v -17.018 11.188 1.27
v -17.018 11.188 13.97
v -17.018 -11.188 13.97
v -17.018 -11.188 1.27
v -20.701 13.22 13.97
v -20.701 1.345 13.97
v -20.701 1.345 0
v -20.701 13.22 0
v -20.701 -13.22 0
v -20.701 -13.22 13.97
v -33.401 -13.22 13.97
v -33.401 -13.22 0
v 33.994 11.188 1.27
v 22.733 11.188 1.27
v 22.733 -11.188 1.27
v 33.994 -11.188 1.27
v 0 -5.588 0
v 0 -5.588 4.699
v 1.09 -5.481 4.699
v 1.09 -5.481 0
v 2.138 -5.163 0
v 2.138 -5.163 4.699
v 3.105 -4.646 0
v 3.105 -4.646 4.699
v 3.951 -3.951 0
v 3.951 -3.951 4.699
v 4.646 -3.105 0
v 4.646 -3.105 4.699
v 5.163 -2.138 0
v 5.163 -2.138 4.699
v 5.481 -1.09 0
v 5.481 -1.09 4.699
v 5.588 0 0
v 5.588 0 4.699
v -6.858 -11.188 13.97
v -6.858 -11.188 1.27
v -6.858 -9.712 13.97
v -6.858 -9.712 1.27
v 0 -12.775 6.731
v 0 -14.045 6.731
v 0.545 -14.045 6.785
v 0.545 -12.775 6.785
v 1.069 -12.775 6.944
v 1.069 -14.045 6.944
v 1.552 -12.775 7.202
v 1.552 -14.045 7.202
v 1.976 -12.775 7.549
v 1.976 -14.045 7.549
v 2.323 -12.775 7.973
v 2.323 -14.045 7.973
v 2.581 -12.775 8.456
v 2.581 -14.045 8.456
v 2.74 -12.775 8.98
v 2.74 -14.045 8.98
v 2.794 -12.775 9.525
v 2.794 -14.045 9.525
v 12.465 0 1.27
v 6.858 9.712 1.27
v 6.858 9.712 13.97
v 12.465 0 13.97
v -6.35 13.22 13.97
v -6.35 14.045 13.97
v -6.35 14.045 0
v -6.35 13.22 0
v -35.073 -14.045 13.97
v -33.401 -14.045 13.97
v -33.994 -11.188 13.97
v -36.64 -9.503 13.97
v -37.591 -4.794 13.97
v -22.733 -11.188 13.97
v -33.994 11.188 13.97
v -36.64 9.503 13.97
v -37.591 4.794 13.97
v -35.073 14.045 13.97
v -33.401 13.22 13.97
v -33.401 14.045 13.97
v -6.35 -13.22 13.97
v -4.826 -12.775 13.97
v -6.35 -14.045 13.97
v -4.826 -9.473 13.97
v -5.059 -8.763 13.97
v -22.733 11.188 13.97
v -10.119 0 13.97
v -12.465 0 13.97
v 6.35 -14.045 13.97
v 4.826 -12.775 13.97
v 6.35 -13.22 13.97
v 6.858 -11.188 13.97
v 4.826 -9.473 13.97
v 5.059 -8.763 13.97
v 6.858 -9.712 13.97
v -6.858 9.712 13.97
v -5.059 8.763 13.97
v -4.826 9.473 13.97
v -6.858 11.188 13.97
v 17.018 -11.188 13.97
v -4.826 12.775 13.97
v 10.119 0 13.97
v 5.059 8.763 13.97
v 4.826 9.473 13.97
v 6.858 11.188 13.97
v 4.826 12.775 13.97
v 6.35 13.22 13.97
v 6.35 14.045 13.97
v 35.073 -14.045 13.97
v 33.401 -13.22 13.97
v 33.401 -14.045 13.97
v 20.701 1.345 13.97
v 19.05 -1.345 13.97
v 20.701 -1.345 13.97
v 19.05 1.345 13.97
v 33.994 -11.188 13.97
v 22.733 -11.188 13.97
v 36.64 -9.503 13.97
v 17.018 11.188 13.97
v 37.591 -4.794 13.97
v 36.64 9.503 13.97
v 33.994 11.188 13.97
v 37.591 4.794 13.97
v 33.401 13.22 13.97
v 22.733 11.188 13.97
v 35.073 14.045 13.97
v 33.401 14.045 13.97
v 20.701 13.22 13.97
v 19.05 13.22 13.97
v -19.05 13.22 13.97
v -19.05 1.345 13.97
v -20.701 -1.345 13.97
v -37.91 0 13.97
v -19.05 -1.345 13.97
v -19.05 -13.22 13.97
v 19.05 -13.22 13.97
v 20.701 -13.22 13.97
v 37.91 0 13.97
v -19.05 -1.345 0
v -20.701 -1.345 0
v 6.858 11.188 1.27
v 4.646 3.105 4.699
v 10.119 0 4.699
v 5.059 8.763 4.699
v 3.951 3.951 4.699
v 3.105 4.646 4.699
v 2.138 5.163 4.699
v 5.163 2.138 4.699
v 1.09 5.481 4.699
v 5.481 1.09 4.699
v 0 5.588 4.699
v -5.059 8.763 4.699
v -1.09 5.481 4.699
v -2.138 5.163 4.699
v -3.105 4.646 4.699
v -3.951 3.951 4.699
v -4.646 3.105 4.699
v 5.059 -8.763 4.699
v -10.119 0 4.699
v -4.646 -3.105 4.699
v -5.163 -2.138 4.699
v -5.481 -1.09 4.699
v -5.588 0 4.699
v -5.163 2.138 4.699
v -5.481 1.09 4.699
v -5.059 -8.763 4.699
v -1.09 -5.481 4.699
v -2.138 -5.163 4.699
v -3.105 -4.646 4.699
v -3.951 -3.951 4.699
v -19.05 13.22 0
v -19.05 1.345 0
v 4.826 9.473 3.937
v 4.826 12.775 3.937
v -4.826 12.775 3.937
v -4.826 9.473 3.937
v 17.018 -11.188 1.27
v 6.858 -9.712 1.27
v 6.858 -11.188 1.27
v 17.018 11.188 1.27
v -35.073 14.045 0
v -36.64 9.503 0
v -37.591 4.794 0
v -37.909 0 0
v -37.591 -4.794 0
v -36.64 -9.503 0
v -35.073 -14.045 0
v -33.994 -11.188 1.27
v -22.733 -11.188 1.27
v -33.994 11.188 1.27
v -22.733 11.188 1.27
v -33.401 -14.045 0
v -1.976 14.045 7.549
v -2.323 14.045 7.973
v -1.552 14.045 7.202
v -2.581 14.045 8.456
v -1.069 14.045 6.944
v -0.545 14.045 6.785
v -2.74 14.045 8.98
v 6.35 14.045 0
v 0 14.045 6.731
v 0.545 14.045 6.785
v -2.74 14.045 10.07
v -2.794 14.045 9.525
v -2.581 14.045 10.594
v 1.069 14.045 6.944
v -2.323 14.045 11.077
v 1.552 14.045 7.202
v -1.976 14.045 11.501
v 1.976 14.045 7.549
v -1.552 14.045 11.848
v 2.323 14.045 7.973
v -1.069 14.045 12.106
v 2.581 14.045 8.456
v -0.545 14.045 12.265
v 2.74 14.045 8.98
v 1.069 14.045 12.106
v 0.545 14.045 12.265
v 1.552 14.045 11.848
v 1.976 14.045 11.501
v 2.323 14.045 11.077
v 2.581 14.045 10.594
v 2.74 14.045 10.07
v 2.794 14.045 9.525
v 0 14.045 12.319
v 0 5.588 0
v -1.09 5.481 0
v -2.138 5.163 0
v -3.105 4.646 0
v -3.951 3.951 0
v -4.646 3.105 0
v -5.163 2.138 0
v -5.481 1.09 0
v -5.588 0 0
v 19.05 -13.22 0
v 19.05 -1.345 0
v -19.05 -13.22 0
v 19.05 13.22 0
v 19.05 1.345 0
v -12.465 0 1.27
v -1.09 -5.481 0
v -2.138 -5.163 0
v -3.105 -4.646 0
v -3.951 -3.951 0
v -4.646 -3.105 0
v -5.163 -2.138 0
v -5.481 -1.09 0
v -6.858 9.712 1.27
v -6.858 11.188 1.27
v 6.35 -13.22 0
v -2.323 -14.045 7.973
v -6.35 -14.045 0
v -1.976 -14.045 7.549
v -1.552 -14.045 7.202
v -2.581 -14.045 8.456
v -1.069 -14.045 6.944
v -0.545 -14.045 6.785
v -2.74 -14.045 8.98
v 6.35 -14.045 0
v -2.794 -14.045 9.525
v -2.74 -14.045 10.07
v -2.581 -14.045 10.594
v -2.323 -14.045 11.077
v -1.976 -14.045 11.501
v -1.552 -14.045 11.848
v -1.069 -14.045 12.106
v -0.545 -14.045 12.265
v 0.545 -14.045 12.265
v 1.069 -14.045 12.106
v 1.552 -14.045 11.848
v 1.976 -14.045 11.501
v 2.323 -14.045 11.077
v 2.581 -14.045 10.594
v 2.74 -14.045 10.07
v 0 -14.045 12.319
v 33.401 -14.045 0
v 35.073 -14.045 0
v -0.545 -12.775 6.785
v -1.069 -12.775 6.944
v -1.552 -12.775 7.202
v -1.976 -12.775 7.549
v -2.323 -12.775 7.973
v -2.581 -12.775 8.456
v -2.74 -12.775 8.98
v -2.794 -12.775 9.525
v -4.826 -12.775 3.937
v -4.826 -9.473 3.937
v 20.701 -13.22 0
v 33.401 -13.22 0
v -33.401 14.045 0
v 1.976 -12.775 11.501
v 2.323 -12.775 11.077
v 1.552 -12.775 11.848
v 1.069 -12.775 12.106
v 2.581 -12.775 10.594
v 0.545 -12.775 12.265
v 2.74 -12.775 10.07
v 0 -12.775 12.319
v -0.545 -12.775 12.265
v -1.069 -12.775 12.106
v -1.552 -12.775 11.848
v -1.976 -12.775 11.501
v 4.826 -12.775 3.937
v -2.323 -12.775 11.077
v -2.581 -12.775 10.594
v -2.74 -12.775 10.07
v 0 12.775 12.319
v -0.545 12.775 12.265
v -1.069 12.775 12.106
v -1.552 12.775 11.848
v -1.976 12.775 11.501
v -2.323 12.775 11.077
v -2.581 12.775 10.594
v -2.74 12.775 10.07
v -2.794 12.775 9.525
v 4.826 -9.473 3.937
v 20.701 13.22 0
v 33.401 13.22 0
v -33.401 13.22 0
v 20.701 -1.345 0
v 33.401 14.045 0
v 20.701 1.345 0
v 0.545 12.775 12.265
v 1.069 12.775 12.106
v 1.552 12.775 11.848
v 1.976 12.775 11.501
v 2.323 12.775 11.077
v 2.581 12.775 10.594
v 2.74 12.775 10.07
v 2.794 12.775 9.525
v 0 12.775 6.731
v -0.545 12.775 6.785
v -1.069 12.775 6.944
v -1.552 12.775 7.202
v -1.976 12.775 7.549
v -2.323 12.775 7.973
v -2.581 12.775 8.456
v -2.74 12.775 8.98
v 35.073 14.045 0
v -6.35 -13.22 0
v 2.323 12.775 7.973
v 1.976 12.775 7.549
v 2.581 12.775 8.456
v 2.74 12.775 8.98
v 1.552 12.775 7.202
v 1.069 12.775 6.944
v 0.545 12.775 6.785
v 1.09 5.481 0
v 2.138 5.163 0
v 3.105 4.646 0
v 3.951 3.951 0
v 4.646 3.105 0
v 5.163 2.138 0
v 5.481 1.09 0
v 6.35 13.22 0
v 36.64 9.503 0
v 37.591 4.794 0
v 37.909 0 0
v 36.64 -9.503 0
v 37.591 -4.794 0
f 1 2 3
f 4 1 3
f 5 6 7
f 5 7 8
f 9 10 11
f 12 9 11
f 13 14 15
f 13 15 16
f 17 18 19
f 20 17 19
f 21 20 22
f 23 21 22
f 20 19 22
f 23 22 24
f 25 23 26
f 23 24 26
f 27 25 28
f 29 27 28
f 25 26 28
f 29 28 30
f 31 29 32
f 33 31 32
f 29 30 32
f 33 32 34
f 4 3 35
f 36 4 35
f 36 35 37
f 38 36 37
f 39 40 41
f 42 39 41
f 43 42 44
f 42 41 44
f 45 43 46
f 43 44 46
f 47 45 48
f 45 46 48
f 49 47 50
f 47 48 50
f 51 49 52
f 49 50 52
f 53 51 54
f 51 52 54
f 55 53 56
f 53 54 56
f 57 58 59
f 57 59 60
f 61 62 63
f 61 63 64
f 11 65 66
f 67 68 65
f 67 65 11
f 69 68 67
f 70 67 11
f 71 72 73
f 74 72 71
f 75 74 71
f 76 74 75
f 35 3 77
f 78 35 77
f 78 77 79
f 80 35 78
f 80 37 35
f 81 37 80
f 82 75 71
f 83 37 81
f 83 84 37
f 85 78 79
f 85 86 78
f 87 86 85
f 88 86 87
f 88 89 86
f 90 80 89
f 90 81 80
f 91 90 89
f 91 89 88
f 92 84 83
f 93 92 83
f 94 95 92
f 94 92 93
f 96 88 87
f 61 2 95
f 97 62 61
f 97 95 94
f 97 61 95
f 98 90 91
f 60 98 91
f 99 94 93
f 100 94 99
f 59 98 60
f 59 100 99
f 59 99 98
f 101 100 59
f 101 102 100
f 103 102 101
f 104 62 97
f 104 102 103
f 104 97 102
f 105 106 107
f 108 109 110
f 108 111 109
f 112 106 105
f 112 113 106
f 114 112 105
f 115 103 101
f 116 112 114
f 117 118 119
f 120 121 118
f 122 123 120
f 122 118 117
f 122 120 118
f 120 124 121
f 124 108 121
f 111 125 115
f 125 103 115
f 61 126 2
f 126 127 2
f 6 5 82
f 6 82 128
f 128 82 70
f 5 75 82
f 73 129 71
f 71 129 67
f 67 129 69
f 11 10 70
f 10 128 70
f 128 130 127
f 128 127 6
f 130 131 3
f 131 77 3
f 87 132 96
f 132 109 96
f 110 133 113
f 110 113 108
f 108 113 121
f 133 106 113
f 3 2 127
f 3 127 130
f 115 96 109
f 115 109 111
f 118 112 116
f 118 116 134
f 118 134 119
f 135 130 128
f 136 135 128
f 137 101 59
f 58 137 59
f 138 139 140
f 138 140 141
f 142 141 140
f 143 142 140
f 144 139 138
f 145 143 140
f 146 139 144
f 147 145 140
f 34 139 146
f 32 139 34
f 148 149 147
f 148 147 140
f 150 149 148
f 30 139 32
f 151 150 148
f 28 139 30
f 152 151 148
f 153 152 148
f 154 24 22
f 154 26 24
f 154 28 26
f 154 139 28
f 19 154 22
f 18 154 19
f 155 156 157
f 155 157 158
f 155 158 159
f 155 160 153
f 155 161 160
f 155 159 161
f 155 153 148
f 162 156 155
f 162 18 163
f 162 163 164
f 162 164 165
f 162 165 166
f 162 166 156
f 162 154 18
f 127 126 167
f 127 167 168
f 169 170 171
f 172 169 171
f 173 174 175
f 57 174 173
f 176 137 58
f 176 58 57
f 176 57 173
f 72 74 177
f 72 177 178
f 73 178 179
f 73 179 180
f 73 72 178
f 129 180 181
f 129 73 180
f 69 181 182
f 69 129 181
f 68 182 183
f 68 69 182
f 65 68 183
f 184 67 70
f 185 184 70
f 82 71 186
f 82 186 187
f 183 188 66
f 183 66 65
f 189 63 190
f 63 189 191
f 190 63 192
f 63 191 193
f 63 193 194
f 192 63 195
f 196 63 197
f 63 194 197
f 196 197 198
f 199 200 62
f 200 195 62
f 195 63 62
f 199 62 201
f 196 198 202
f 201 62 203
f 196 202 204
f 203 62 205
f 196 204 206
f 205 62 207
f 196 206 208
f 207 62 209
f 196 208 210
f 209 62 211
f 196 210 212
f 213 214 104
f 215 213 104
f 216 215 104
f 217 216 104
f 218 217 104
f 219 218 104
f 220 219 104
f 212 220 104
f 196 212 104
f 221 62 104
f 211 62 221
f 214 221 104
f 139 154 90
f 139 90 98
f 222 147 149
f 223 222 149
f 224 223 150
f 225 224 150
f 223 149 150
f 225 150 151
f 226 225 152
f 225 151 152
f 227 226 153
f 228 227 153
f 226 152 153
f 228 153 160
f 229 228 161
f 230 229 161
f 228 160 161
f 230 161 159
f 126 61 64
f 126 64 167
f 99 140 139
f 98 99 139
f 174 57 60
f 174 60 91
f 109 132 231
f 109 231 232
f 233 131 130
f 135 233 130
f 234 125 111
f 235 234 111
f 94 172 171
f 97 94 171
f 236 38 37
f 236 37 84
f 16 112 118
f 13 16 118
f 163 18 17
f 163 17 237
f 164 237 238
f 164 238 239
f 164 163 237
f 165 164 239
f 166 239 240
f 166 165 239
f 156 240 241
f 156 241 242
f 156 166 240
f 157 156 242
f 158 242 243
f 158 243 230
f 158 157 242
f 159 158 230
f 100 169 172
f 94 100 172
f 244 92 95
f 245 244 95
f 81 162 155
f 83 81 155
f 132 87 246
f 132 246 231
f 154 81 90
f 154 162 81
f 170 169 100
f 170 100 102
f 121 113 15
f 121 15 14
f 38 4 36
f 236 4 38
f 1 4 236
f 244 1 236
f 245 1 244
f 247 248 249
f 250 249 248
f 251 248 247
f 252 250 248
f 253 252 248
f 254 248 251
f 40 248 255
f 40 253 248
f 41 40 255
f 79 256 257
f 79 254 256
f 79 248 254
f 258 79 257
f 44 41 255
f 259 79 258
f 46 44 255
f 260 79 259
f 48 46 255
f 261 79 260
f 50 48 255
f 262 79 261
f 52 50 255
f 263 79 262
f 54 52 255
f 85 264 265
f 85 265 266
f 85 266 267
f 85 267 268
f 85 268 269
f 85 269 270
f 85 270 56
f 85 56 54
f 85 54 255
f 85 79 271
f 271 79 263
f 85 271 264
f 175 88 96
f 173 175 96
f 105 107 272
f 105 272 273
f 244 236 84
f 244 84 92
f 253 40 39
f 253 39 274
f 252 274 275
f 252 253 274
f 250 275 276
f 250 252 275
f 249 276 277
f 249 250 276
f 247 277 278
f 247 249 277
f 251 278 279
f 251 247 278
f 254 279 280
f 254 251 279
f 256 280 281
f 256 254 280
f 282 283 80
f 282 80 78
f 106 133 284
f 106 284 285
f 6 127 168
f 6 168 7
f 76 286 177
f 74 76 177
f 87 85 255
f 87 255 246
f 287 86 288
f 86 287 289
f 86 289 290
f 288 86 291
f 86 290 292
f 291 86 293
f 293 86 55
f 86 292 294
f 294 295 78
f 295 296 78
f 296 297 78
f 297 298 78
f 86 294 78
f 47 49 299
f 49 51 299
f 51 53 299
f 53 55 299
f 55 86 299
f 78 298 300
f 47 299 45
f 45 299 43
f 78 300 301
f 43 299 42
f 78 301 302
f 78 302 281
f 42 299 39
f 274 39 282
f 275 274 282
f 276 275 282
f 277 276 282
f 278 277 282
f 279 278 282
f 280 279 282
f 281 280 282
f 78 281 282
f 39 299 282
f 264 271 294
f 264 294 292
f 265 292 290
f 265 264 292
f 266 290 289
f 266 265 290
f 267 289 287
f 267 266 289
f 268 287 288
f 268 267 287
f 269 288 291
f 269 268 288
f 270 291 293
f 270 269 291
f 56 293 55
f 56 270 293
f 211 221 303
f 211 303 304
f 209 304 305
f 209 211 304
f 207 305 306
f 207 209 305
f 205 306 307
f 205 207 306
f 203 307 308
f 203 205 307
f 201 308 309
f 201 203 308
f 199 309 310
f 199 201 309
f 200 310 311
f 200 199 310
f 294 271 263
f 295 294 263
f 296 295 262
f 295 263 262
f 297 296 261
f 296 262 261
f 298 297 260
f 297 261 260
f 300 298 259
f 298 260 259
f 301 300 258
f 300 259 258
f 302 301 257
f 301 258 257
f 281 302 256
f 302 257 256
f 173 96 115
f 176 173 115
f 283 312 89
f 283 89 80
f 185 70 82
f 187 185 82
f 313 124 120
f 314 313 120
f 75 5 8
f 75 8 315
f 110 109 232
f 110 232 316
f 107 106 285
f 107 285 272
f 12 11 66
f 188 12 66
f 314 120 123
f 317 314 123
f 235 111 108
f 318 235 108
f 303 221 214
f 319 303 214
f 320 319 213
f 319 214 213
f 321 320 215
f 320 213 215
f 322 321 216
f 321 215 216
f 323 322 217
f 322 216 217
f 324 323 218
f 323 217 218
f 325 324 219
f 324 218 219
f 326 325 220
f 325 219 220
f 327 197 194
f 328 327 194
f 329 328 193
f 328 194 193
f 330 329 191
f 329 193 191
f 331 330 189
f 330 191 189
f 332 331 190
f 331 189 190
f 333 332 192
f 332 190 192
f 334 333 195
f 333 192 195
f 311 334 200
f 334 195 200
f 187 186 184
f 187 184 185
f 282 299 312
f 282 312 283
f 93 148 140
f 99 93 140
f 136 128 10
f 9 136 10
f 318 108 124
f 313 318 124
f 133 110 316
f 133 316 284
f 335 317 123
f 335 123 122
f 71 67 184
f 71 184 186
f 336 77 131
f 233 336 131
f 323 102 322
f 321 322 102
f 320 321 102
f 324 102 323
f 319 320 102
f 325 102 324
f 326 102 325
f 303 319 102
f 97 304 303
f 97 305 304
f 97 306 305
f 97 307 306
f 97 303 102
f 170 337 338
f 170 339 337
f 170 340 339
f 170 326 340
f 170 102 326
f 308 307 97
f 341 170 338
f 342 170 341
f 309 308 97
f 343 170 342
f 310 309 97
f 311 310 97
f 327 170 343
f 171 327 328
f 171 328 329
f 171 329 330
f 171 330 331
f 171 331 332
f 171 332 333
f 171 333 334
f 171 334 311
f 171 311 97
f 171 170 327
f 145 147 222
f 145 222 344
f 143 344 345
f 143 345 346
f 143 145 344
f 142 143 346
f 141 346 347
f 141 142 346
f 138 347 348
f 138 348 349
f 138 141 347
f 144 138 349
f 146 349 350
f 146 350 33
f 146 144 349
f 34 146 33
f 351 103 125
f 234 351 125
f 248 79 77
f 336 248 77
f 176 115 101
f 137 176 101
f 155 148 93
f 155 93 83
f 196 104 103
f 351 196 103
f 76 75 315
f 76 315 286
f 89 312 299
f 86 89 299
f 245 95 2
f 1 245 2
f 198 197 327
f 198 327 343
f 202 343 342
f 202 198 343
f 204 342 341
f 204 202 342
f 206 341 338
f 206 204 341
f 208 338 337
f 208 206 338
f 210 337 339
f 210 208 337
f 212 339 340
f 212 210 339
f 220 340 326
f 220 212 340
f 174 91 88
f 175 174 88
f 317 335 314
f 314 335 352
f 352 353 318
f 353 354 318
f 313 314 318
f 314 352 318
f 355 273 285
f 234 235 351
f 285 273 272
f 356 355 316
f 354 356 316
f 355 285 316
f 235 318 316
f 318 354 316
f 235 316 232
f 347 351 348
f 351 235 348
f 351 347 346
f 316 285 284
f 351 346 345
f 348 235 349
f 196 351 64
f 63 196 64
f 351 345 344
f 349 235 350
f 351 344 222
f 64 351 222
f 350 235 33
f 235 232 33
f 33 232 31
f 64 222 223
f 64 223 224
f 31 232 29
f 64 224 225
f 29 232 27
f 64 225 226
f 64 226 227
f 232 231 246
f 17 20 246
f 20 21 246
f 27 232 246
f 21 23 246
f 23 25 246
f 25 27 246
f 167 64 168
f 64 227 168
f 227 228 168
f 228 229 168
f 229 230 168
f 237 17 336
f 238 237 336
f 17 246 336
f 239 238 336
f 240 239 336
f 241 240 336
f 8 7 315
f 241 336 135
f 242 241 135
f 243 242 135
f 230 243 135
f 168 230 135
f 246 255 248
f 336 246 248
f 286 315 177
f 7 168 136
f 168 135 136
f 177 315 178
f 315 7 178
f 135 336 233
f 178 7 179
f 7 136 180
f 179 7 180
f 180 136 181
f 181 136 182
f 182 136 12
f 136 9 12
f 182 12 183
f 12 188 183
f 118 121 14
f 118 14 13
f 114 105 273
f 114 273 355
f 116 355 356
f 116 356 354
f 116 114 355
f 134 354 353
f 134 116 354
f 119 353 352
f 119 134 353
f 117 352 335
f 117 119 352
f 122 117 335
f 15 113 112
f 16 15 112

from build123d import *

# Parameters (mm, degrees)
F1_DEPTH  = 9.525
F3_DEPTH  = 6.35
F4_W      = 9.652
F4_H      = 3.302
F5_DEPTH  = 5.588
F7_DEPTH  = 4.826
F9_DEPTH  = 4.699
F11_DEPTH = 1.778
F16_W     = 80.8186978102
F16_H     = 32.7942222357
F17_DEPTH = 5.08
F18_W     = 11.260668817
F18_H     = 22.375507099
F19_DEPTH = 12.7


with BuildPart() as f1:
    # F0 (on Top) → F1 (new body)
    with BuildSketch(Plane.XY):
        with BuildLine():
            Line((-33.401, 14.0452535495), (-35.0732901119, 14.0452535495))
            ThreePointArc((-35.0732901119, 14.0452535495), (-37.1933629546, 7.1643777434), (-37.9095, 0))
            Line((-37.9095, 0), (0, 0))
            Line((0, 0), (0, 14.0452535495))
            Line((0, 14.0452535495), (-6.35, 14.0452535495))
            Line((-6.35, 14.0452535495), (-6.35, 13.2197535495))
            Line((-6.35, 13.2197535495), (-19.05, 13.2197535495))
            Line((-19.05, 13.2197535495), (-19.05, 1.3452535495))
            Line((-19.05, 1.3452535495), (-20.701, 1.3452535495))
            Line((-20.701, 1.3452535495), (-20.701, 13.2197535495))
            Line((-20.701, 13.2197535495), (-33.401, 13.2197535495))
            Line((-33.401, 13.2197535495), (-33.401, 14.0452535495))
        make_face()
    extrude(amount=F1_DEPTH)

    # F2 (on face) → F3 (cut)
    with BuildSketch(Plane.XY.offset(9.525)):
        Polygon((5.1326438931, -8.89), (10.2652877862, 0), (5.1326438931, 8.89), (0, 8.89), (0, 0), (-10.2652877862, 0), (-5.1326438931, -8.89), align=None)
    extrude(amount=-F3_DEPTH, mode=Mode.SUBTRACT)

    # F4 (on face) → F5 (cut)
    with BuildSketch(Plane.XY.offset(9.525)):
        with Locations((0, -11.1242535495)):
            Rectangle(F4_W, F4_H)
        with Locations((0, 11.1242535495)):
            Rectangle(F4_W, F4_H)
    extrude(amount=-F5_DEPTH, mode=Mode.SUBTRACT)

    # F6 (on face) → F7 (cut)
    with BuildSketch(Plane.XY.offset(9.525)):
        Polygon((-5.0593204089, -8.763), (5.0593204089, -8.763), (10.1186408178, 0), (5.0593204089, 8.763), (-5.0593204089, 8.763), (-10.1186408178, 0), align=None)
    extrude(amount=-F7_DEPTH, mode=Mode.SUBTRACT)

    # F8 (on face) → F9 (cut, through all)
    with BuildSketch(Plane.XY.offset(4.699)):
        with BuildLine():
            Line((0, 0), (0, 5.588))
            ThreePointArc((0, 5.588), (-3.9513126933, 3.9513126933), (-5.588, 0))
            Line((-5.588, 0), (0, 0))
        make_face()
    extrude(amount=-F9_DEPTH, mode=Mode.SUBTRACT)

    # F10 (on face) → F11 (cut)
    with BuildSketch(Plane(origin=(0, 14.0452535495, 0), x_dir=(-1, 0, 0), z_dir=(0, 1, 0))):
        with BuildLine():
            Line((0, 9.525), (2.794, 9.525))
            ThreePointArc((2.794, 9.525), (-1.9756563466, 11.5006563466), (0, 6.731))
            Line((0, 6.731), (0, 9.525))
        make_face()
        with BuildLine():
            ThreePointArc((0, 6.731), (1.9756563466, 7.5493436534), (2.794, 9.525))
            Line((2.794, 9.525), (0, 9.525))
            Line((0, 9.525), (0, 6.731))
        make_face()
    extrude(amount=-F11_DEPTH, mode=Mode.SUBTRACT)

    # F12: F1 across plane


with BuildPart() as f1_1:
    add(f1.part)
    add(f1.part.mirror(Plane.XZ))

    # F13: F1 across plane


with BuildPart() as f1_2:
    add(f1_1.part)
    add(f1_1.part.mirror(Plane.YZ))

    # F15: F1 across plane


with BuildPart() as f1_3:
    add(f1_2.part)
    add(f1_2.part.mirror(Plane.XY.offset(9.525)))

    # F16 (on face) → F17 (cut)
    with BuildSketch(Plane.XY.offset(19.05)):
        Rectangle(F16_W, F16_H)
    extrude(amount=-F17_DEPTH, mode=Mode.SUBTRACT)

    # F18 (on face) → F19 (cut)
    with BuildSketch(Plane.XY.offset(13.97)):
        with Locations((-28.3633344085, 0)):
            Rectangle(F18_W, F18_H)
        Polygon((-6.858, 11.1877535495), (-17.018, 11.1877535495), (-17.018, -11.1877535495), (-6.858, -11.1877535495), (-6.858, -9.7115955617), (-12.4649923118, 0), (-6.858, 9.7115955617), align=None)
        Polygon((17.018, 11.1877535495), (6.858, 11.1877535495), (6.858, 9.7115955617), (12.4649923118, 0), (6.858, -9.7115955617), (6.858, -11.1877535495), (17.018, -11.1877535495), align=None)
        with Locations((28.3633344085, 0)):
            Rectangle(F18_W, F18_H)
    extrude(amount=-F19_DEPTH, mode=Mode.SUBTRACT)

    # F20: F1 across plane


with BuildPart() as f1_4:
    add(f1_3.part)
    add(f1_3.part.mirror(Plane.XZ))


solid = f1_4.part
